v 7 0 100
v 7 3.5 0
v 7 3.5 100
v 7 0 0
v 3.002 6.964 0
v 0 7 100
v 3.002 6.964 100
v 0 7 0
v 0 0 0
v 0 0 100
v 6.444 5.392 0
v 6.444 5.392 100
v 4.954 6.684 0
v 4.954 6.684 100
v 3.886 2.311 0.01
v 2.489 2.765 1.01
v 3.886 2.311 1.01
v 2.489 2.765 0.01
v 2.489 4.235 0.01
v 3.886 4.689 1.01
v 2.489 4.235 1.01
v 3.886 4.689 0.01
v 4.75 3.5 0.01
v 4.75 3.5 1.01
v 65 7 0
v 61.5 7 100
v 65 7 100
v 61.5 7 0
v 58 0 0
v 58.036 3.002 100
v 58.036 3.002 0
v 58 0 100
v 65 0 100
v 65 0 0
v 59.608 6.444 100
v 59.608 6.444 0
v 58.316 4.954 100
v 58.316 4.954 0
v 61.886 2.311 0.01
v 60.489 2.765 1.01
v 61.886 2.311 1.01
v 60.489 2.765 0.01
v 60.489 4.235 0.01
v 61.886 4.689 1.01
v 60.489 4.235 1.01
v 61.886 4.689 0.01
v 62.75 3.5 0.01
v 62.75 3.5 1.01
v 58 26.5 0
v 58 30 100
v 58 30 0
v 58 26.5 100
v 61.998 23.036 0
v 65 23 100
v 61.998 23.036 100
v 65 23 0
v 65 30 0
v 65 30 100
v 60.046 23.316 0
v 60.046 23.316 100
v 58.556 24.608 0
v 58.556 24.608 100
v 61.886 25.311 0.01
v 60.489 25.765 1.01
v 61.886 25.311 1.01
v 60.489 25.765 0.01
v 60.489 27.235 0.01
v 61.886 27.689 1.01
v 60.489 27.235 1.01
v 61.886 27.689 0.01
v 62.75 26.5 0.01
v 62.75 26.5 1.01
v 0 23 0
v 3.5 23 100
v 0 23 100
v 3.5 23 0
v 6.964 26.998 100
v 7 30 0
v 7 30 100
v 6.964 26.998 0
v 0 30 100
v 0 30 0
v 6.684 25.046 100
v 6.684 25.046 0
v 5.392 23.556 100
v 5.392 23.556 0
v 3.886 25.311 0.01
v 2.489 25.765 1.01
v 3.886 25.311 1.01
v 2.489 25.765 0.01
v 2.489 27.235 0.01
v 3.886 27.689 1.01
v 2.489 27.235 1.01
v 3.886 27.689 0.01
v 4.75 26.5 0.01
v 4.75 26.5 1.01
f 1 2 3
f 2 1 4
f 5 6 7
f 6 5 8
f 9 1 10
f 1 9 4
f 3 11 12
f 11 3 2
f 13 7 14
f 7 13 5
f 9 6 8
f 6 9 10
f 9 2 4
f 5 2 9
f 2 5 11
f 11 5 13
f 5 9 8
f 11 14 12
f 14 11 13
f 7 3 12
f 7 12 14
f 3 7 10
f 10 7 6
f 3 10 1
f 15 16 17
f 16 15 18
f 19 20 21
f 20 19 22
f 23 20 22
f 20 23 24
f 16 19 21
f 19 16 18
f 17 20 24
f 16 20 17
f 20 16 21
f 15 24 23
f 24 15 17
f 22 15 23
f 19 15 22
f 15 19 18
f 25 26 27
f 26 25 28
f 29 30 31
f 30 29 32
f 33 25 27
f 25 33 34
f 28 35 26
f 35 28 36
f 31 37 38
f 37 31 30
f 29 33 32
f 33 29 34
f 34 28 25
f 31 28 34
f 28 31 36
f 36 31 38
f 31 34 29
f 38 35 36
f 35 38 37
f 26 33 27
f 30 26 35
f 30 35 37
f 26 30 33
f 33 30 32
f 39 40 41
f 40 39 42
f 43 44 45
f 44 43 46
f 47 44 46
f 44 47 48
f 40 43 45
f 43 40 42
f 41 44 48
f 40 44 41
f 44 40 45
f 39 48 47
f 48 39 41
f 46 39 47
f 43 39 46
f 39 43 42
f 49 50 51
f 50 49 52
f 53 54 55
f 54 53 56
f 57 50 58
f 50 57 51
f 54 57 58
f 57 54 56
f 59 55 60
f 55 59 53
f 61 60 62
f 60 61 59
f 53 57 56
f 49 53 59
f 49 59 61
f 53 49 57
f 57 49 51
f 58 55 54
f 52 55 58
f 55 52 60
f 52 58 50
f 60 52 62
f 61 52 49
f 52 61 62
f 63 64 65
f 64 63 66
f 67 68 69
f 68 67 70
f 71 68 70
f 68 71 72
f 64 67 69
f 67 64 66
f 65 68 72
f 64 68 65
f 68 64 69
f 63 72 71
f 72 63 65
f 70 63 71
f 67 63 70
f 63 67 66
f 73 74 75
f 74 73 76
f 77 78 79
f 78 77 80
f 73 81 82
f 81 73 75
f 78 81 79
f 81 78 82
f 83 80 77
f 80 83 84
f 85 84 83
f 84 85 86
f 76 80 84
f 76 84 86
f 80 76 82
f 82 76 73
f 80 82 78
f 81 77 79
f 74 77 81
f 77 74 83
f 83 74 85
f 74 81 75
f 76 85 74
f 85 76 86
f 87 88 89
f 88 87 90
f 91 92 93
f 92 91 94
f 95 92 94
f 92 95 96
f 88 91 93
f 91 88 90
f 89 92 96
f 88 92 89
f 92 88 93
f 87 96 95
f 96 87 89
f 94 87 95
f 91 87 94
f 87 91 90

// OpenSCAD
// file: hinge.scad
axle_gap=1.6;
hinge_gap=1.4;
slop=0.01;
hinge_rotate=0;
module __Customizer_Limit__ () {}

box_width=60;
box_height=10;
box_depth=20;
hinge_width=5;
hinge_seperation=4.8;


module test()
{
box_a();

translate([0, 0, hinge_height])
  rotate([0, hinge_rotate,0]) 
  translate([0, 0, -hinge_height])
  box_b();

hinge(0, 12);
hinge(0, 48);
}

module hinge(axis, offset, hinge_rise=4.0, hinge_reach=0.1, axle_thickness=1.2, hinge_width=5, hinge_gap=0.4)
{
  hinge_arm(axis, offset, hinge_rise, hinge_reach, axle_thickness, hinge_width, hinge_gap);
  hinge_bay(axis, offset, hinge_rise, hinge_reach, axle_thickness, hinge_width, hinge_gap);
}

module hinge_arm(axis, offset, hinge_rise, hinge_reach, axle_thickness, hinge_width, hinge_gap)
{
  axle_radius=axle_thickness*2;
  outer_axle_radius = axle_radius + axle_thickness + axle_gap;

  hinge_height=box_height + hinge_rise;
  translate([axis, offset - hinge_width/2, hinge_height])
  rotate([-90,0,0]) 
  linear_extrude(hinge_width)
  {
    difference()
    {
      hull()
      {
        circle(r = outer_axle_radius);
        translate([hinge_seperation - 0.1, 0, 0])
          square([hinge_reach, hinge_height]);
      }
      circle(r = axle_radius + axle_gap);
    }
  }
}

module hinge_bay(axis, offset, hinge_rise, hinge_reach, axle_thickness, hinge_width, hinge_gap)
{
  axle_radius=axle_thickness*2;
  outer_axle_radius = axle_radius + axle_thickness + axle_gap;

  hinge_height=box_height + hinge_rise;
  hinge_bay_width = hinge_width + hinge_gap*2;
  translate([axis, offset - hinge_width - hinge_gap, hinge_height])
  rotate([-90,0,0])
  union()
  {
    rotate([0,0,hinge_rotate])
    difference()
    {
      linear_extrude(hinge_width*2 + hinge_gap*2)
      hull()
      {
        translate([0, 0, - axle_gap])
        circle(r = outer_axle_radius);
        translate([-hinge_seperation-hinge_seperation - hinge_reach, 0, 0])
        square([hinge_reach, hinge_height]);
      }
      
      translate([-hinge_seperation-axle_gap, - outer_axle_radius -.8, hinge_width/2])
        cube([(outer_axle_radius+axle_gap)*2, hinge_height + outer_axle_radius + 1, hinge_bay_width]);

    }

    translate([0, 0, hinge_width/2])
      cylinder(h = hinge_bay_width, r = axle_radius);
  }
}

module box_a()
  {
    translate([hinge_seperation, 0, 0])
    cube([box_depth,box_width,box_height]);    
  }
  
module box_b()
  {
    rotate([0,180,0])
    translate([hinge_seperation, 0, -box_height])
    cube([box_depth,box_width,box_height]);    
  }
// file: rpi.scad
 // include <./RPi4board-modded.scad>;



// translate([5, 61, 5])
  // rotate([0, 0, 270])
   // board_raspberrypi_4_model_b();


// rpi4([2, 2, 2], [0, 0, 2]);


slop=0.01;
module rpi4(
  rpi_buffer, 
  rpi_padding,
  expose_card=false,
  expose_hdmi=false,
  expose_usb1=false,
  expose_usb2=false,
  expose_ribbon_cable=false,
  expose_gpio_pins=false,
  head_room=4
  )
{
  rpi_screws=[58, 49, 3];
  rpi_size=[88, 58, 13];

  difference() {
    gen_rpi(rpi_screws, rpi_size, rpi_buffer, rpi_padding, expose_card, expose_hdmi, expose_usb1,   expose_usb2, expose_ribbon_cable, expose_gpio_pins, head_room);
  
    // usb 1
    translate([92, 6, 5])
      cube([16, 16, 18]);

    // usb 2
    translate([92, 24, 5])
      cube([16, 16, 18]);

    // ethernet
    translate([92, 42, 5])
      cube([16, 18, 16]);

    // power
    translate([9, -slop, rpi_padding.z + rpi_buffer.z])
      cube([14, rpi_buffer.x + 2*slop, 7]);

    // hdmi
    translate([26.5, -slop, rpi_padding.z + rpi_buffer.z])
      cube([9, rpi_buffer.x + 2*slop, 5]);

    // hdm2
    translate([40, -slop, rpi_padding.z + rpi_buffer.z])
      cube([9, rpi_buffer.x + 2*slop, 5]);

  }
}

module rpi0(
  rpi_buffer, 
  rpi_padding,
  expose_card=false,
  expose_hdmi=false,
  expose_usb1=false,
  expose_usb2=false,
  expose_ribbon_cable=false,
  expose_gpio_pins=false,
  head_room=4
  )
{
  rpi_screws=[58, 23, 3];
  rpi_size=[65, 30, 3];

  gen_rpi(rpi_screws, rpi_size, rpi_buffer, rpi_padding, expose_card, expose_hdmi, expose_usb1, expose_usb2, expose_ribbon_cable, expose_gpio_pins, head_room);
  
  
  
}

module gen_rpi(
  rpi_screws, 
  rpi_size,
  
  rpi_buffer, 
  rpi_padding,
  expose_card=false,
  expose_hdmi=false,
  expose_usb1=false,
  expose_usb2=false,
  expose_ribbon_cable=false,
  expose_gpio_pins=false,
  head_room=4
  )
{
  rpi_envelope=rpi_size + [2, 2, 4];
  sdcard_allowance= expose_card ? 0 : 2;

  mezz_height= max( rpi_padding.z, 3);
  rpi_cutout = rpi_envelope + rpi_padding * 2 - [0, 0, rpi_padding.z];
  rpi_origin = rpi_buffer;
    
  difference()
  {
    union()
    {
      difference()
      {
        cube(rpi_cutout + rpi_buffer + [rpi_buffer.x + sdcard_allowance, rpi_buffer.y, head_room]);
        translate(rpi_origin + [0,0,0])
        cube(rpi_cutout + [0,0,rpi_padding.z + rpi_buffer.z + slop]);
      }
      
      translate(rpi_origin + [rpi_padding.x + 3, rpi_padding.y + 3, 0])
        screws(rpi_screws, mezz_height);
    }
    
    
    
    
    // graphics ribbon
    if (expose_ribbon_cable) {
      translate(rpi_buffer + [-rpi_buffer.x - slop, 7, rpi_buffer.z + rpi_padding.z])
      cube([rpi_buffer.x + rpi_padding.x + slop + slop, 17, rpi_cutout.z]);
    }

    // sd card slot
    if (expose_card) {
      translate(rpi_buffer + [rpi_envelope.x - slop - 1, 11, -rpi_buffer.z - slop])
      cube([rpi_buffer.x + 10 + sdcard_allowance, 15, rpi_cutout.z + rpi_buffer.z*3]);
    }

    if (expose_gpio_pins) {
      translate(rpi_buffer + rpi_padding + [7, -rpi_buffer.y -slop, 0])
      cube([rpi_buffer.x + 12 + 39, rpi_buffer.y + 1 + slop*2, rpi_cutout.z + slop]);
    }

    translate(rpi_buffer + [1, rpi_envelope.y - slop, rpi_buffer.z + rpi_padding.z - 1])
    {
      // usb slot
      if (expose_usb2) {
        translate([5, 0, 0])
        cube([11, rpi_buffer.y + slop*2, 8]);
      }
      // usb slot
      if (expose_usb1) {
        translate([19, 0, 0])
        cube([11, rpi_buffer.y + slop*2, 8]);
      }
      // hdmi
      if (expose_hdmi) {
        translate([44.6, 0, 0])
        cube([16, rpi_buffer.y + slop*2, 8]);
      }
    }
  }
}

module screws(rpi_screws, screw_height)
{
  screw_mount(screw_height, 0);

  translate([rpi_screws.x, 0, 0])
  screw_mount(screw_height, 90);

  translate([rpi_screws.x, rpi_screws.y, 0])
  screw_mount(screw_height, 180);

  translate([0, rpi_screws.y, 0])
  screw_mount(screw_height, 270);
}

module screw_mount(screw_mount_height, rotation)
{
  difference()
  {
    screw_diameter = 1.25;
    screw_mount_dia = 3.5;
    
    translate([screw_mount_dia/2 + 1.75, screw_mount_dia/2 + 1.75, 0])
    rotate(rotation)
    linear_extrude(screw_mount_height)
    hull() {
      mount_size = screw_mount_dia;
      circle(mount_size);
      polygon([[-mount_size, mount_size], [-mount_size,-mount_size], [mount_size,-mount_size]]);
    }
    translate([screw_mount_dia/2 + 1.75, screw_mount_dia/2 +  1.75, slop])
    cylinder(r = screw_diameter, h = screw_mount_height);
  }
}
// main file
include <./rpi.scad>;
include <./hinge.scad>;

rpi0_buffer=3;
bay_buffer=2;

rpi0();
